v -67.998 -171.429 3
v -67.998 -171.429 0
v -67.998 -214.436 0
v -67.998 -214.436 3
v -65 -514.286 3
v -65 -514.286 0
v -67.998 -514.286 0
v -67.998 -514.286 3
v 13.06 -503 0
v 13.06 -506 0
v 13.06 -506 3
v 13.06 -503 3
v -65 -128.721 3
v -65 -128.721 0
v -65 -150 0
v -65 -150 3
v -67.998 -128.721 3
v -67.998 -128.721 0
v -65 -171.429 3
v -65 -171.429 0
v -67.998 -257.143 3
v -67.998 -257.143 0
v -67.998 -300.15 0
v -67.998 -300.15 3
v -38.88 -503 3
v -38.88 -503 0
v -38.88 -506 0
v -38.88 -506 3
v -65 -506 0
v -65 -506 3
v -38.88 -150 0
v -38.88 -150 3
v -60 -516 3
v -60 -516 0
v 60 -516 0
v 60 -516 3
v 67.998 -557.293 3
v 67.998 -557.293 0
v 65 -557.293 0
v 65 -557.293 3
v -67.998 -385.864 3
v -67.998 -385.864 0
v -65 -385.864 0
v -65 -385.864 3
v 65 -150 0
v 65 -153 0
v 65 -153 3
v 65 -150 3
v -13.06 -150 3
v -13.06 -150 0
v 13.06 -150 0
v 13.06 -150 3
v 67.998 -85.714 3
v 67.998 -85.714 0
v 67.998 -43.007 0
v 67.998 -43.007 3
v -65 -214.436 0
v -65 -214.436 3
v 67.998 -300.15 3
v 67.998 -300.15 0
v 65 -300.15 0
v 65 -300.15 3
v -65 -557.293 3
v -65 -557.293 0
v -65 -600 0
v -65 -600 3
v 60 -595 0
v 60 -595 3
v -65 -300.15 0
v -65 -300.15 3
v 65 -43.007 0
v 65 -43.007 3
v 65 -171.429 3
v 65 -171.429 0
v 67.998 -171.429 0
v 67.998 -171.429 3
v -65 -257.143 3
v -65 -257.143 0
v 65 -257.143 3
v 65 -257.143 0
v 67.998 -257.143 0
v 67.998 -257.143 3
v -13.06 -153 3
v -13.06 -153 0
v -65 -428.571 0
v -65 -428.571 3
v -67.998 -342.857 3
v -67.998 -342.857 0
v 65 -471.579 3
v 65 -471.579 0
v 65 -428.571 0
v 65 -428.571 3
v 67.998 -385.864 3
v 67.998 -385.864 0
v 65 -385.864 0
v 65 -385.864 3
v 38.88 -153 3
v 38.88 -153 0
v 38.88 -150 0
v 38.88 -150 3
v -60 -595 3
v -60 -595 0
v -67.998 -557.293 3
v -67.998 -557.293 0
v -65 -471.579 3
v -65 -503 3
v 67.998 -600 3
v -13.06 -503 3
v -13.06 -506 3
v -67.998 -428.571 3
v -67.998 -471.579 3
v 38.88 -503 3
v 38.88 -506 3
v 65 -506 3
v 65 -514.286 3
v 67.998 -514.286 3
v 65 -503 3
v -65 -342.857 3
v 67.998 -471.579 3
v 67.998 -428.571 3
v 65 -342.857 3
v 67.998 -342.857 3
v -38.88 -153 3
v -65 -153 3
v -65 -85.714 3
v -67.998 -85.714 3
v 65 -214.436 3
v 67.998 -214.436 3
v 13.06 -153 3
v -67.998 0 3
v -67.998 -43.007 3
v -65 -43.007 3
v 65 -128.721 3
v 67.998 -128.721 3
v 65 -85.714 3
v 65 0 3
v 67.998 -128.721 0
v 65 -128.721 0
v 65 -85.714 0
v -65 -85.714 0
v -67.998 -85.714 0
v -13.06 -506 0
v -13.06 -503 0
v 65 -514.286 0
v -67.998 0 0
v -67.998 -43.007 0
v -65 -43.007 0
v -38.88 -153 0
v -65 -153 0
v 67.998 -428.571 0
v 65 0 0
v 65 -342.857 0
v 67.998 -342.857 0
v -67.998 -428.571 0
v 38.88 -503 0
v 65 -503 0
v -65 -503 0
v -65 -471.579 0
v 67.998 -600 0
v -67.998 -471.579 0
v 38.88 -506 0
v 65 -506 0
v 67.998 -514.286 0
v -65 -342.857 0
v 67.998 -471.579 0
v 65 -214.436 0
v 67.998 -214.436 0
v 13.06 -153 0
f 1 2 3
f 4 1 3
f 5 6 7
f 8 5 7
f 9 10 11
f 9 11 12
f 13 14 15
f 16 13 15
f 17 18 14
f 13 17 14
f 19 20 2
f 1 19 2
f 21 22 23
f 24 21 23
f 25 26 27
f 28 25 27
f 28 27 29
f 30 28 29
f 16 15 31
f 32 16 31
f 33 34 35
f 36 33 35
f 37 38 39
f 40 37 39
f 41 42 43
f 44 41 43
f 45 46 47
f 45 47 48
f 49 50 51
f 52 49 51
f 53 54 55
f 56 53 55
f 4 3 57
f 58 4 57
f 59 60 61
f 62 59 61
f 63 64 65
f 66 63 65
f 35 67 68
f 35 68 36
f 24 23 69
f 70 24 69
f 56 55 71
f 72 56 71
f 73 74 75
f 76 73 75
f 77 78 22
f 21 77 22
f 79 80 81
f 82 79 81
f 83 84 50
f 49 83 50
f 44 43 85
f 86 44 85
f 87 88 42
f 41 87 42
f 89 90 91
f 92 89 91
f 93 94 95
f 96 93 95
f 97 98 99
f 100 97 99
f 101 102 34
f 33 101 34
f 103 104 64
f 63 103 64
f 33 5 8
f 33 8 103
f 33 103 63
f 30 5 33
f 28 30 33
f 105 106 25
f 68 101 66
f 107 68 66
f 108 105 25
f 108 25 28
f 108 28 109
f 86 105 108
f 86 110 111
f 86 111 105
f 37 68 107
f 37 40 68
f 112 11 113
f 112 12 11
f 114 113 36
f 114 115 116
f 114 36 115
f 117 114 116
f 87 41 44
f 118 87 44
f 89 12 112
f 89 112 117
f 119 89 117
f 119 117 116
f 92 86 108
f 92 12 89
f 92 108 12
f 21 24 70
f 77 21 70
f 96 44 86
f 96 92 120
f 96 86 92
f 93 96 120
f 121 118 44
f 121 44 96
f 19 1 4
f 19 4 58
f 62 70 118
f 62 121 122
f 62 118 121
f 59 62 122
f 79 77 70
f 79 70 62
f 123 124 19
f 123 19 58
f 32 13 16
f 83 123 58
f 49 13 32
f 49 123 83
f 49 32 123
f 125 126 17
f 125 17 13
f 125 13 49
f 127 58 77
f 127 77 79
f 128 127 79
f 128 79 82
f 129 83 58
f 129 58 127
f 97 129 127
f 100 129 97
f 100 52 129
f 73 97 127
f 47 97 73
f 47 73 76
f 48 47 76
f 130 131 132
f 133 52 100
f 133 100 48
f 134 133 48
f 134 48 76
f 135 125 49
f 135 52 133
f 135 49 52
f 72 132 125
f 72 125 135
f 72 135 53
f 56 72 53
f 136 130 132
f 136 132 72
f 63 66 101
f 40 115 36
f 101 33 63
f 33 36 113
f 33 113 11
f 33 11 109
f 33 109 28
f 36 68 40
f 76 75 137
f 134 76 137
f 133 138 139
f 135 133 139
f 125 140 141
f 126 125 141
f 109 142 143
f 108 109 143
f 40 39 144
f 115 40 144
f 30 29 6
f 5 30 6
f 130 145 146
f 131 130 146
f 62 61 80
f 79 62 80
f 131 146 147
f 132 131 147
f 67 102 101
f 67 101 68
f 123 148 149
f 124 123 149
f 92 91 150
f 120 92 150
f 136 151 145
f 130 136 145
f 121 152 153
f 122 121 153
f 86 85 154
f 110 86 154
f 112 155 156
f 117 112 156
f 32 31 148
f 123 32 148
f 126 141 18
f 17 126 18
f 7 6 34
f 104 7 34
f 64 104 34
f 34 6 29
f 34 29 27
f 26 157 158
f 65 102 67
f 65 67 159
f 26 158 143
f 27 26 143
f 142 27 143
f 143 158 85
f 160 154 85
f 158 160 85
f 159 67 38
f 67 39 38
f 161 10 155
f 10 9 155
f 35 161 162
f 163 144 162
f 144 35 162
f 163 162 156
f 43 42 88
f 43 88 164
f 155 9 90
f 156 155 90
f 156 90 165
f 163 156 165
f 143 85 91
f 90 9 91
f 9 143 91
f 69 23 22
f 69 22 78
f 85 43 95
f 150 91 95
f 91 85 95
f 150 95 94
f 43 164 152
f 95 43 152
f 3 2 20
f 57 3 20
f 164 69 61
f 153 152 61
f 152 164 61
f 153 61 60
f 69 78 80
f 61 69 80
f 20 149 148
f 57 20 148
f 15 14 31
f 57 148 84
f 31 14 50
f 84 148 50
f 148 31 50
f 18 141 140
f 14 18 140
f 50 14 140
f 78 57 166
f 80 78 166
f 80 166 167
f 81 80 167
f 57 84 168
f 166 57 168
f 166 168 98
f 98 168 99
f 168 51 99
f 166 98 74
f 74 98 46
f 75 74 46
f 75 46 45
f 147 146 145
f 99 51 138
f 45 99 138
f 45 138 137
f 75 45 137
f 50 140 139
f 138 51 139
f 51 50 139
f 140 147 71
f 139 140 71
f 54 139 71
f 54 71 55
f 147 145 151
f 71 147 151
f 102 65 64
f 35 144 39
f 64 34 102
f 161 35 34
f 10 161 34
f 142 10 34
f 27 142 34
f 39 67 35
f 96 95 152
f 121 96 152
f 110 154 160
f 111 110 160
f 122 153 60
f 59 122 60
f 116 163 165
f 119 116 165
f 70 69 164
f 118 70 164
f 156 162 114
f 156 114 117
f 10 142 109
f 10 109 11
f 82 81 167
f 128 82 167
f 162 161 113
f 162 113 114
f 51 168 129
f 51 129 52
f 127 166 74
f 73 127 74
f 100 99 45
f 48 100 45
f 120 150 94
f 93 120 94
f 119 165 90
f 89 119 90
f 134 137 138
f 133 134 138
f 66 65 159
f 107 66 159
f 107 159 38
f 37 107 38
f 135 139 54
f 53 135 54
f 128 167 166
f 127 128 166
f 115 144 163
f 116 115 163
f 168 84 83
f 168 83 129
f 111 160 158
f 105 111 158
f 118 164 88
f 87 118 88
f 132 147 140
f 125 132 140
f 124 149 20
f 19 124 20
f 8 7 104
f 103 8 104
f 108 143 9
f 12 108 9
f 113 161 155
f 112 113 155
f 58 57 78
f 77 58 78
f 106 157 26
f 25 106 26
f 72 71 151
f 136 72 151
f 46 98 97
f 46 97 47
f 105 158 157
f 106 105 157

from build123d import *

# Parameters (mm, degrees)
SKETCH1_W           = 120
SKETCH1_H           = 79
SKETCH1_W_2         = 26.12
SKETCH1_H_2         = 3
BOSS_EXTRUDE1_DEPTH = 3


with BuildPart() as part:
    # Sketch1 → Boss-Extrude1 (new body)
    with BuildSketch(Plane.XY):
        Polygon((65, 0), (-67.997818333, 0), (-67.997818333, -43.007142857), (-65, -43.007142857), (-65, -85.714285714), (-67.997818333, -85.714285714), (-67.997818333, -128.721428571), (-65, -128.721428571), (-65, -150), (-38.88, -150), (-38.88, -153), (-65, -153), (-65, -171.428571429), (-67.997818333, -171.428571429), (-67.997818333, -214.435714286), (-65, -214.435714286), (-65, -257.142857143), (-67.997818333, -257.142857143), (-67.997818333, -300.15), (-65, -300.15), (-65, -342.857142857), (-67.997818333, -342.857142857), (-67.997818333, -385.864285714), (-65, -385.864285714), (-65, -428.571428571), (-67.997818333, -428.571428571), (-67.997818333, -471.578571429), (-65, -471.578571429), (-65, -503), (-38.88, -503), (-38.88, -506), (-65, -506), (-65, -514.285714286), (-67.997818333, -514.285714286), (-67.997818333, -557.292857143), (-65, -557.292857143), (-65, -600), (67.997818333, -600), (67.997818333, -557.292857143), (65, -557.292857143), (65, -514.285714286), (67.997818333, -514.285714286), (67.997818333, -471.578571429), (65, -471.578571429), (65, -428.571428571), (67.997818333, -428.571428571), (67.997818333, -385.864285714), (65, -385.864285714), (65, -342.857142857), (67.997818333, -342.857142857), (67.997818333, -300.15), (65, -300.15), (65, -257.142857143), (67.997818333, -257.142857143), (67.997818333, -214.435714286), (65, -214.435714286), (65, -171.428571429), (67.997818333, -171.428571429), (67.997818333, -128.721428571), (65, -128.721428571), (65, -85.714285714), (67.997818333, -85.714285714), (67.997818333, -43.007142857), (65, -43.007142857), align=None)
        with Locations((0, -555.5)):
            Rectangle(SKETCH1_W, SKETCH1_H, mode=Mode.SUBTRACT)
        with Locations((0, -504.5)):
            Rectangle(SKETCH1_W_2, SKETCH1_H_2, mode=Mode.SUBTRACT)
        with Locations((51.94, -504.5)):
            Rectangle(SKETCH1_W_2, SKETCH1_H_2, mode=Mode.SUBTRACT)
        with Locations((0, -151.5)):
            Rectangle(SKETCH1_W_2, SKETCH1_H_2, mode=Mode.SUBTRACT)
        with Locations((51.94, -151.5)):
            Rectangle(SKETCH1_W_2, SKETCH1_H_2, mode=Mode.SUBTRACT)
    extrude(amount=BOSS_EXTRUDE1_DEPTH)


solid = part.part
